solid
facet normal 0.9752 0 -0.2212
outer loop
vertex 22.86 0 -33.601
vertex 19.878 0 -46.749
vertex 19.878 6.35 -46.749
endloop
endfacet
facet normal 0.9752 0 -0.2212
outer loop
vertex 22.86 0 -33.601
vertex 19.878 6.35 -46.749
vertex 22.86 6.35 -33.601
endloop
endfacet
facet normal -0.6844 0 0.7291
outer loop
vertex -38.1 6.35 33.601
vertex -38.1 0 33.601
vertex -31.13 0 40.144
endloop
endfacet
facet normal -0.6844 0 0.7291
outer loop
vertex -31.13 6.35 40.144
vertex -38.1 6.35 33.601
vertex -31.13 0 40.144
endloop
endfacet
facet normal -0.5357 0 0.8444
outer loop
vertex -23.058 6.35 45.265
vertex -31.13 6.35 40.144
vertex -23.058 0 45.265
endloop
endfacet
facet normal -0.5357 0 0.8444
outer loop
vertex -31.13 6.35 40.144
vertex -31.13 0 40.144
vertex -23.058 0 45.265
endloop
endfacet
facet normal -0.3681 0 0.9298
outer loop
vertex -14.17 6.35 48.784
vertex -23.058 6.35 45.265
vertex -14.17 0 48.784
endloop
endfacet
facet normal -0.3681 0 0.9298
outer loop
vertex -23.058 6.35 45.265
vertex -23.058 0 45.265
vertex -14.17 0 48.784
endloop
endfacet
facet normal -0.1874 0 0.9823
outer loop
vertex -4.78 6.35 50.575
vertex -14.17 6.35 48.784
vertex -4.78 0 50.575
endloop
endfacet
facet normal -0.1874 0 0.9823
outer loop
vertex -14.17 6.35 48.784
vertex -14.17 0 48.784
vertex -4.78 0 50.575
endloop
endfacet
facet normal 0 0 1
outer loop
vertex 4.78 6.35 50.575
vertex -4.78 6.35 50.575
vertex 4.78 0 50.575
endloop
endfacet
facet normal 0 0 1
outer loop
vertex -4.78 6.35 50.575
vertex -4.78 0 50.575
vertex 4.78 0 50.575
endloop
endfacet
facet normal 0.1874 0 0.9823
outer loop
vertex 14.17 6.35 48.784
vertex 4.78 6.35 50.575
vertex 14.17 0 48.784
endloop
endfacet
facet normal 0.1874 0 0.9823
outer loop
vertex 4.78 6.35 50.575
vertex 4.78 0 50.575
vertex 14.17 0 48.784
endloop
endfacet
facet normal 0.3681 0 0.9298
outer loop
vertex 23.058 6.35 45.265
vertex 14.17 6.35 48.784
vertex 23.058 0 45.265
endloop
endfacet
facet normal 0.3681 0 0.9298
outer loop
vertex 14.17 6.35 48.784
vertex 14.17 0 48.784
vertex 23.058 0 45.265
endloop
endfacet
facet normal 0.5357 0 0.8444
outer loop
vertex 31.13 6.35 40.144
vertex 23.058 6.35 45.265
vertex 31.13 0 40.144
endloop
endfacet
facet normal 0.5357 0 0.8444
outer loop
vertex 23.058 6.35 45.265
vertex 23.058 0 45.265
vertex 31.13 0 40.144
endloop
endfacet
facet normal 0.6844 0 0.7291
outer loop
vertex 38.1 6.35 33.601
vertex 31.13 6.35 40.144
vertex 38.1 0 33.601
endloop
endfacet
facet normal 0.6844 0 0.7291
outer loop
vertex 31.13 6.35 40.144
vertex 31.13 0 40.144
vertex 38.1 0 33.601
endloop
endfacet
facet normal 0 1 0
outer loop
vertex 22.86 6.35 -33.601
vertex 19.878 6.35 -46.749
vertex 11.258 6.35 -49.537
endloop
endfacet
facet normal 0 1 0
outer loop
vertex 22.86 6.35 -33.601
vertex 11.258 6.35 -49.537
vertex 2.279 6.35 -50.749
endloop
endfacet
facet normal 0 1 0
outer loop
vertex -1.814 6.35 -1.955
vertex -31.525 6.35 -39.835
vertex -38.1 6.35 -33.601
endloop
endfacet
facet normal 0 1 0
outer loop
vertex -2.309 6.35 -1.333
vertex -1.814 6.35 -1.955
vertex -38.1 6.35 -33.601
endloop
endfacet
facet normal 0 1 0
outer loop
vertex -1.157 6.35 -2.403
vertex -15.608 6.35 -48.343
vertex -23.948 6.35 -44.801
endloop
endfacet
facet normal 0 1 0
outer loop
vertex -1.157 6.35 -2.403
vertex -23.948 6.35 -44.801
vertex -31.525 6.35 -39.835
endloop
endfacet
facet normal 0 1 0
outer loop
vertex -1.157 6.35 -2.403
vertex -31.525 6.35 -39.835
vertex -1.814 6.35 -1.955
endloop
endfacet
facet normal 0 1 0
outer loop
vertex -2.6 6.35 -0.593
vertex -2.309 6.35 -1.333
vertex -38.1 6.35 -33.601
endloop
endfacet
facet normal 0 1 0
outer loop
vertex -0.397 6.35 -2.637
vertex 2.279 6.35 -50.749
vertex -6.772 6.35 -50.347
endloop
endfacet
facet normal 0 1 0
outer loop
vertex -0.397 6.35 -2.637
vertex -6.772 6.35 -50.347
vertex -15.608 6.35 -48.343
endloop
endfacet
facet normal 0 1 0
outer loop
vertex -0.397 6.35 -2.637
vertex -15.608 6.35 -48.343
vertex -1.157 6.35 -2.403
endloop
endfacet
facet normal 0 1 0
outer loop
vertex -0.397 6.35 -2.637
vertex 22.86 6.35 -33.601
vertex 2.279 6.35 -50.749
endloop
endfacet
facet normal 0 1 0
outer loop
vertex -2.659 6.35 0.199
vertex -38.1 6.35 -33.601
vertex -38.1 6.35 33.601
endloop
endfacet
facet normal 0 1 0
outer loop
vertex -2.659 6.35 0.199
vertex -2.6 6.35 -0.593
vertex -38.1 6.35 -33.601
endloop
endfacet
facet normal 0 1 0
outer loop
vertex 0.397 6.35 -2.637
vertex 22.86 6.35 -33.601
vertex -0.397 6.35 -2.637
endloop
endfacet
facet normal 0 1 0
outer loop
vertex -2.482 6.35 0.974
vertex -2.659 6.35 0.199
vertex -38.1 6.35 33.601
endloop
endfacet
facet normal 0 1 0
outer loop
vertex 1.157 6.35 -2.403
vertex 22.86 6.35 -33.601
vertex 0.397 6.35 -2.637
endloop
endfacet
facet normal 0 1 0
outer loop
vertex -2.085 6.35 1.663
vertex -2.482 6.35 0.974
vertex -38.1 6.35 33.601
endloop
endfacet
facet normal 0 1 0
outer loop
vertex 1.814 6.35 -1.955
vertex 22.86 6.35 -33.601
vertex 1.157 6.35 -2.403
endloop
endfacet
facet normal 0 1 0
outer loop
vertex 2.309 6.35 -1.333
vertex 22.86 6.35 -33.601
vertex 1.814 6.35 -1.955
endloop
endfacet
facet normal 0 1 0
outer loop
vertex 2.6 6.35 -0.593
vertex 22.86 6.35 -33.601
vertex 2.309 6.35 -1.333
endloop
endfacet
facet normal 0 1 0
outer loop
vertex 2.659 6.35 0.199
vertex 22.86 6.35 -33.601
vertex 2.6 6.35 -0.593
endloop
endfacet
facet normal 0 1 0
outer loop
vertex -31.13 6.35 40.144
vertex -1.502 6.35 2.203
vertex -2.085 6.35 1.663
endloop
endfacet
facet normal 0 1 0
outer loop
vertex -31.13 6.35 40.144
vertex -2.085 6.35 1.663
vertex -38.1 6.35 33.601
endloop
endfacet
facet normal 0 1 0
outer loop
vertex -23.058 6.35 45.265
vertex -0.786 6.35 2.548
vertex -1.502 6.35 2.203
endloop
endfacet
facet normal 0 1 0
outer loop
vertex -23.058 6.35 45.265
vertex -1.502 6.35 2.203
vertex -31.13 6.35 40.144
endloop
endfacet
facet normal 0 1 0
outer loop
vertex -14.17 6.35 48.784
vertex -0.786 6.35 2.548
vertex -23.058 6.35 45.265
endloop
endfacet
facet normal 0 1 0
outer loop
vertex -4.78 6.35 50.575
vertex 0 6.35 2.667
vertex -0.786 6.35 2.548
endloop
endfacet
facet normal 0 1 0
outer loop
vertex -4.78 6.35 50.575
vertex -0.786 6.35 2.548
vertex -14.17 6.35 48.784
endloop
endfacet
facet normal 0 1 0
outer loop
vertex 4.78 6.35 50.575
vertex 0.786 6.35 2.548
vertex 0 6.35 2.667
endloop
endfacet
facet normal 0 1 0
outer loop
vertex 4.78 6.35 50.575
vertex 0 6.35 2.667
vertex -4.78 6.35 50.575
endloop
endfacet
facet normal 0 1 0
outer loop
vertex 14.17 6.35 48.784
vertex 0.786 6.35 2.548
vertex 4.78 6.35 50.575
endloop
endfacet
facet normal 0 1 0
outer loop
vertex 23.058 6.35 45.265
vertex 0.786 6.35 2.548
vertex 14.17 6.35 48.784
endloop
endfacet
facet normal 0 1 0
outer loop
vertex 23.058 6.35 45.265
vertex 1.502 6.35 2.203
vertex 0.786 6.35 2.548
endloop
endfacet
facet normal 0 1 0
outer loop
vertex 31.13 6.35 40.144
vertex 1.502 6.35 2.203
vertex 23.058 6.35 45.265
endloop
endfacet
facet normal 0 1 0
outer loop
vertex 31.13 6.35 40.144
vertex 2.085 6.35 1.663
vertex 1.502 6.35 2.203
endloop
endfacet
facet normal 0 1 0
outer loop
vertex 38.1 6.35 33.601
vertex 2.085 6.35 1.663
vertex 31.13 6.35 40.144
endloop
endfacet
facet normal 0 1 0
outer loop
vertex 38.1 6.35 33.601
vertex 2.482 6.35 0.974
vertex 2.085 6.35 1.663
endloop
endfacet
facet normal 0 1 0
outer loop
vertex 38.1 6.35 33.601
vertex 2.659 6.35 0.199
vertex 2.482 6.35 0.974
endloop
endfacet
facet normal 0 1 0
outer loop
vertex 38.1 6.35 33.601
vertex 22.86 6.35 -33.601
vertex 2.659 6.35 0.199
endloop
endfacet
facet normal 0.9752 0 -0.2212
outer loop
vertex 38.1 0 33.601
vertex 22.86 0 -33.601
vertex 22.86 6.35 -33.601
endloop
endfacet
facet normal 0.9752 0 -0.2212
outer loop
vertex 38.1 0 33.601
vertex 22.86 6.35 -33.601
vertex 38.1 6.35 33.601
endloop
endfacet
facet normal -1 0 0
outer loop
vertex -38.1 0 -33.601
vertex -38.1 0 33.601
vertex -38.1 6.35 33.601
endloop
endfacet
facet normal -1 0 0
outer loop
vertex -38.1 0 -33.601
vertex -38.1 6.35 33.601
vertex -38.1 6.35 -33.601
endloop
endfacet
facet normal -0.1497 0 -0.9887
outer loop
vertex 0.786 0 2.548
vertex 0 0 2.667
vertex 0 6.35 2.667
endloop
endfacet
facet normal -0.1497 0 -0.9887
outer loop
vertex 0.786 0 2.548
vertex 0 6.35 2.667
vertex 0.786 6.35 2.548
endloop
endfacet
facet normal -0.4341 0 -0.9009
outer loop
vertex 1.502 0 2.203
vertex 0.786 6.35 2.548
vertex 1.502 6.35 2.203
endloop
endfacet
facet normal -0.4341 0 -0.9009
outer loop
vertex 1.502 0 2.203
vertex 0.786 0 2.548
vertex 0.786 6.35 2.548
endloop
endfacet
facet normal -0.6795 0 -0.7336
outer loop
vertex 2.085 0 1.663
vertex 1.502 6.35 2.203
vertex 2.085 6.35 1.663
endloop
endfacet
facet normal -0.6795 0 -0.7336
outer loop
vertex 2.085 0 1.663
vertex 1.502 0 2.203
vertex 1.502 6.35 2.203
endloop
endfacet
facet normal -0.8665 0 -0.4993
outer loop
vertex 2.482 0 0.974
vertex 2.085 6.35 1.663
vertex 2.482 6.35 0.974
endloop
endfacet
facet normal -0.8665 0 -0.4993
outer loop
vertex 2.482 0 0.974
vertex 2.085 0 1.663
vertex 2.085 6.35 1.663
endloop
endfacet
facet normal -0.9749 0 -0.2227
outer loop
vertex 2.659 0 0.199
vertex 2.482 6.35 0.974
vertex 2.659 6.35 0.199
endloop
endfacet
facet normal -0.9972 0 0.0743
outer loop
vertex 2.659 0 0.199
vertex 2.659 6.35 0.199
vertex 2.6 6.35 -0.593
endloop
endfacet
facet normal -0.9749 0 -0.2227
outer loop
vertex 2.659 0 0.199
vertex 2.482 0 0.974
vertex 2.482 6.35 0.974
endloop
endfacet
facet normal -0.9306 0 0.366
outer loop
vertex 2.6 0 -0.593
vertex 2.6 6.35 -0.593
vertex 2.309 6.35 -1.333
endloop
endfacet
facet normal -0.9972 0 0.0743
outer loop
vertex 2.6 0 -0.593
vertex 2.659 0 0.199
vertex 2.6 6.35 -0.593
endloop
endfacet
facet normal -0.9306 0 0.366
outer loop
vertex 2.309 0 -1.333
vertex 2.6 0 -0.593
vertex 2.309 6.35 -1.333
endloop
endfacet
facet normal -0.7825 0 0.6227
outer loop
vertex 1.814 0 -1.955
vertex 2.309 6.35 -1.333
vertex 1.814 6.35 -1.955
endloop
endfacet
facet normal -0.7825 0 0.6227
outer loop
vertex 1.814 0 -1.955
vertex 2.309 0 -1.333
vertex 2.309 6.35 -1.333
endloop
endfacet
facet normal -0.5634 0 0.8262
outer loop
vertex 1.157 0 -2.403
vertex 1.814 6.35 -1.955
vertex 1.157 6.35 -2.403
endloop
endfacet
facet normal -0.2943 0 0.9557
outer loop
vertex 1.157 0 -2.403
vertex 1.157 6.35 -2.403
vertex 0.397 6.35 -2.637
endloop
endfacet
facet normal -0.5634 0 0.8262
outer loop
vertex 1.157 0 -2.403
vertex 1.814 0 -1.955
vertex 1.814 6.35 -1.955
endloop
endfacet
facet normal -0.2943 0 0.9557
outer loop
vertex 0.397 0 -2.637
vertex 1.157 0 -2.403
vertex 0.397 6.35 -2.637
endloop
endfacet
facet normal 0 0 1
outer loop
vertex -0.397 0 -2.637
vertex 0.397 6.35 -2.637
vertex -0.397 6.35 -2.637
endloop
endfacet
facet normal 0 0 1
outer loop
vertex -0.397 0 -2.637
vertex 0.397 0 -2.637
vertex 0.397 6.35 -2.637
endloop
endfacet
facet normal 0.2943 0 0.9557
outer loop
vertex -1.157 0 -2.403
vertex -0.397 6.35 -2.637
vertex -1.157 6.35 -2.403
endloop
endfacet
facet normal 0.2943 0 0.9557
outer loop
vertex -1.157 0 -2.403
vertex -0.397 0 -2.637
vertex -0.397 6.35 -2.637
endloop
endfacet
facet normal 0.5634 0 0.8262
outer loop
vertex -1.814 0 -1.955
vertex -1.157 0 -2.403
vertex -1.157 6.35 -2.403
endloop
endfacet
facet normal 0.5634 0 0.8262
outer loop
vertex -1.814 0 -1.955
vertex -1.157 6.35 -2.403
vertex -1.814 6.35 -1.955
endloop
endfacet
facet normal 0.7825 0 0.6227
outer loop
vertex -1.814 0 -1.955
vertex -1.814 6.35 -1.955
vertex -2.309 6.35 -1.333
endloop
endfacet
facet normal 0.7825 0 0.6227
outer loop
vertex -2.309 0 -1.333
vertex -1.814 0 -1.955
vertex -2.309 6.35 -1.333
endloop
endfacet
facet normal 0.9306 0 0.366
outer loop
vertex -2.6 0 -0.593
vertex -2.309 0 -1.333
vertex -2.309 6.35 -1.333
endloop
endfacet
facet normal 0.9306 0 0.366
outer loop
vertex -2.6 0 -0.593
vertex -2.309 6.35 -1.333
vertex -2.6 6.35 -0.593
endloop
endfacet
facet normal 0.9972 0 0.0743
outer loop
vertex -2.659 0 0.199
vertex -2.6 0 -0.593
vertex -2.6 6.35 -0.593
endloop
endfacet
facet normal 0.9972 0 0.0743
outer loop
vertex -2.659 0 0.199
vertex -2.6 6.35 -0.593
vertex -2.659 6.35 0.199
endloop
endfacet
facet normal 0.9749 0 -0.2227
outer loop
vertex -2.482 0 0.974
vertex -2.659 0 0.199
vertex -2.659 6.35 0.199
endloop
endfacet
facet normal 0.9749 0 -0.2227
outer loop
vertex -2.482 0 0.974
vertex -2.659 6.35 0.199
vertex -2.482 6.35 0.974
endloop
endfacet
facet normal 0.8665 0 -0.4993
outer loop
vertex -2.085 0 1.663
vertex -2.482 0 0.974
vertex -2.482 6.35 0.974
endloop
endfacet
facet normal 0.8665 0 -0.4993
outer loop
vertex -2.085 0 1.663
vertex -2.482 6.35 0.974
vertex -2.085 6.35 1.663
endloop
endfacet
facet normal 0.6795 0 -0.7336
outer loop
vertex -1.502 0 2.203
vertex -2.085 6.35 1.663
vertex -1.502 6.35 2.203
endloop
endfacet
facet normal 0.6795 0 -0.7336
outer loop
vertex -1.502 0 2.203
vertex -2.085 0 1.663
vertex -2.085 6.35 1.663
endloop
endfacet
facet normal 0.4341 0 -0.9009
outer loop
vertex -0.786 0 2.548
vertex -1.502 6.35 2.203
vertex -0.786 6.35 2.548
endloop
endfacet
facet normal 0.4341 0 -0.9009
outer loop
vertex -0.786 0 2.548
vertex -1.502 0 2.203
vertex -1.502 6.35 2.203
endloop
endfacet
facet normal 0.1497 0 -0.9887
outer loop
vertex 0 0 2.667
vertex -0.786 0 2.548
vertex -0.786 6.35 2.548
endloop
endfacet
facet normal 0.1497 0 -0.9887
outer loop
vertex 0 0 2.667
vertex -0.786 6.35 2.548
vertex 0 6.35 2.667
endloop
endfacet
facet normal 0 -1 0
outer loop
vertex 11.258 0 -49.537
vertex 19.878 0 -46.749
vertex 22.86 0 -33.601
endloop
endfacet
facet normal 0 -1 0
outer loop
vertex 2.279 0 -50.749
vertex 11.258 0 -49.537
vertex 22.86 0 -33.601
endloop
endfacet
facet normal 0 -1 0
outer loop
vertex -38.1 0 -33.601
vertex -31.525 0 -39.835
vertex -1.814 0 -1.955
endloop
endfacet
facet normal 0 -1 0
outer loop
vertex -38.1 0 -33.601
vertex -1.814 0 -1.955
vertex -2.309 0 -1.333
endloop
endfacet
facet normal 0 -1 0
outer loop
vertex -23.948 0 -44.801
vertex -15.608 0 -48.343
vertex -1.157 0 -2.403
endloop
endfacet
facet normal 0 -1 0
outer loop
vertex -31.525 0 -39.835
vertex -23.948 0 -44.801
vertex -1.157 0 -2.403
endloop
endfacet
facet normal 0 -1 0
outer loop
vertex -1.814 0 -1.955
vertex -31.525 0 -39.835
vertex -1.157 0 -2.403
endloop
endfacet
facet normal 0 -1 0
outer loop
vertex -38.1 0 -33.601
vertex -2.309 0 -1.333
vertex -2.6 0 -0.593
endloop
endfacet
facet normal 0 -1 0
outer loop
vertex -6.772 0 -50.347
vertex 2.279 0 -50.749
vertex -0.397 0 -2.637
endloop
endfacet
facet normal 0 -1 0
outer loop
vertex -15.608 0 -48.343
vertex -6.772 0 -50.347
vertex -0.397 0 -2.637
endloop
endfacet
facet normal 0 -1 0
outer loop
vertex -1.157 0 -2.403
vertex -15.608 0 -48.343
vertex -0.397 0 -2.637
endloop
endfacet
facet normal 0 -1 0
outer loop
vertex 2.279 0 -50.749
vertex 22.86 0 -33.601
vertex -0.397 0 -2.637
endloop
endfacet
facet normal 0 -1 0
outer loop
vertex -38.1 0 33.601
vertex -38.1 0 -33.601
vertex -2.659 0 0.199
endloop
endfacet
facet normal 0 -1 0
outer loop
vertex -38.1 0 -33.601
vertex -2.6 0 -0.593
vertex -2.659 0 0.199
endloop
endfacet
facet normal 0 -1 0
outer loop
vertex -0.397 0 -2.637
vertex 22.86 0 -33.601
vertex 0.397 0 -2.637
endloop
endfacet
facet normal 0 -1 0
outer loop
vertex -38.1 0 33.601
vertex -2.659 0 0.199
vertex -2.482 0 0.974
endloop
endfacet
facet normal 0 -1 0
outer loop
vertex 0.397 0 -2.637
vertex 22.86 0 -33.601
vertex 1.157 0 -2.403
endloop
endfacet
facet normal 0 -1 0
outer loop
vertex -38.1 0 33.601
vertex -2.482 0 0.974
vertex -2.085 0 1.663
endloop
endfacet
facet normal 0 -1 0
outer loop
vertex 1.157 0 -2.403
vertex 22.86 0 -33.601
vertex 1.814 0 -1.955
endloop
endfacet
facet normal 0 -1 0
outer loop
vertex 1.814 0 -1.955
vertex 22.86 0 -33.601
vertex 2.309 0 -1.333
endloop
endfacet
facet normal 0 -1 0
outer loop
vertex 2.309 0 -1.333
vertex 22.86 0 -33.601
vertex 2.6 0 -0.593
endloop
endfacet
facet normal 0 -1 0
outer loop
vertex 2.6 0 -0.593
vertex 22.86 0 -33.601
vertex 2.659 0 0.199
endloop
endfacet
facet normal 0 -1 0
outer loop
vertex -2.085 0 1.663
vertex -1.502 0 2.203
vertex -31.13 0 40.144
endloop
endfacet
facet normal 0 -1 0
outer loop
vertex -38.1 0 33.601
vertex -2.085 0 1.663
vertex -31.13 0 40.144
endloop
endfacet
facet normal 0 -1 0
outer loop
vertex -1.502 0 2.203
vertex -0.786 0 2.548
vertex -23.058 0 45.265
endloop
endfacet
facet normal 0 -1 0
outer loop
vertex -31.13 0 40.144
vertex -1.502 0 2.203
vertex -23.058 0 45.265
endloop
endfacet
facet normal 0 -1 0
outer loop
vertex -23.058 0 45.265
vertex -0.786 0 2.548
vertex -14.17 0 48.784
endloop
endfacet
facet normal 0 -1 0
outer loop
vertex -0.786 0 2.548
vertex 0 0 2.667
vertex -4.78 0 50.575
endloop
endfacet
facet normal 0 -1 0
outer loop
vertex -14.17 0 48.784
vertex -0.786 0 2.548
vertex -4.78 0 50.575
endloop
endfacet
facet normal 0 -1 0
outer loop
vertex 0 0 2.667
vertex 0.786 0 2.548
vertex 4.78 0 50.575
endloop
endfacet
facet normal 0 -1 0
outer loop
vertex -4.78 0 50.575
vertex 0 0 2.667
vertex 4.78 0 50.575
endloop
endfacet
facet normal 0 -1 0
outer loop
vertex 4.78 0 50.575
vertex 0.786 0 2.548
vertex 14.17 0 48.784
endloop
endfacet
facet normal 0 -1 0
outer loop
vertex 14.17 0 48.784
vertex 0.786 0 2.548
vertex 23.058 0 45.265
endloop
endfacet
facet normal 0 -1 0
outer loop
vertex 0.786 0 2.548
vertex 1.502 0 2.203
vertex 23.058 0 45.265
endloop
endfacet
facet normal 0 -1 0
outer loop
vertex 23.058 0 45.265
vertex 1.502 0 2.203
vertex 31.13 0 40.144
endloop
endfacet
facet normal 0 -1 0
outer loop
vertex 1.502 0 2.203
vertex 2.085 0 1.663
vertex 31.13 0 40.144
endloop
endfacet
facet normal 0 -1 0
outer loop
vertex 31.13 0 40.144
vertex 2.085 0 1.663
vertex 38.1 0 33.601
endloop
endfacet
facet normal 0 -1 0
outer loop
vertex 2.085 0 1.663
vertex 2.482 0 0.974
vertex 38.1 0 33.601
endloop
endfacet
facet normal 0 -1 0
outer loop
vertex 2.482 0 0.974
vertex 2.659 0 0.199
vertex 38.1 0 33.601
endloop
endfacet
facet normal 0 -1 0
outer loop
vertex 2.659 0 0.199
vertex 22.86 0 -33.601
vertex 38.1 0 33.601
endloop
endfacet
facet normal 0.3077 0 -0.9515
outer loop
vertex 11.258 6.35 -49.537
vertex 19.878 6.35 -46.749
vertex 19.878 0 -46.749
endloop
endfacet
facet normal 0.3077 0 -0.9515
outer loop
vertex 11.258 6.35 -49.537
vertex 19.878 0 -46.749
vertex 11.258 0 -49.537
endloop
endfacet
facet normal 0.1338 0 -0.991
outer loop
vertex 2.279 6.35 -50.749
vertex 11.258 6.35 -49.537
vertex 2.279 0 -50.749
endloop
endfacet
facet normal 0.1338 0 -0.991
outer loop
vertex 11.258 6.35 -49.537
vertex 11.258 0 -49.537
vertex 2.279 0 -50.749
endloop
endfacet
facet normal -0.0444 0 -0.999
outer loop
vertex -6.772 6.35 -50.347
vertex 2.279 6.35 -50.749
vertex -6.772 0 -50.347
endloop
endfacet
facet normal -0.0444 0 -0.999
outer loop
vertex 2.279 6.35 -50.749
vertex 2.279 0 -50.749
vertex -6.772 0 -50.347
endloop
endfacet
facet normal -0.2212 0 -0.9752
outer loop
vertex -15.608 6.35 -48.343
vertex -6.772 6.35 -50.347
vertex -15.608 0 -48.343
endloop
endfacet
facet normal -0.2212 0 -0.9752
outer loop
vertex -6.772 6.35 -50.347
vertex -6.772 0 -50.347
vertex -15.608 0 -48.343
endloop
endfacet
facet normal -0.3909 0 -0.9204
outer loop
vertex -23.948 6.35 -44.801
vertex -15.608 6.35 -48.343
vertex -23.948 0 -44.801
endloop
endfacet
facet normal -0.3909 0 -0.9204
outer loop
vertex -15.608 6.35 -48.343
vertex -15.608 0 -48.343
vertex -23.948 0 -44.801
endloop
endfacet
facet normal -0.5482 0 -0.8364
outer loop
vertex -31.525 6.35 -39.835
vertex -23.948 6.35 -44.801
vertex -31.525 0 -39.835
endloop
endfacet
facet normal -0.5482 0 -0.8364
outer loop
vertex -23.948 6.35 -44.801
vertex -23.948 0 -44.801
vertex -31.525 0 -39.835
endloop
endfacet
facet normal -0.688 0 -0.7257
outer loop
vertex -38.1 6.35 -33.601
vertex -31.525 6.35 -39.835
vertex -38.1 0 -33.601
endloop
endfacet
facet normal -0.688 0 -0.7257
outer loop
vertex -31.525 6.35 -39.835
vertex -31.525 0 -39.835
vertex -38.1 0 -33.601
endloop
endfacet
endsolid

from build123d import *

# Parameters (mm, degrees)
SKETCH1_R           = 50.8
SKETCH1_R_2         = 2.666666667
BOSS_EXTRUDE1_DEPTH = 6.35
CUT_EXTRUDE1_START  = -12.7
CUT_EXTRUDE1_DEPTH  = 12.7
CUT_EXTRUDE2_START  = -17.348
CUT_EXTRUDE2_DEPTH  = 17.348


with BuildPart() as part:
    # Sketch1 → Boss-Extrude1 (new body)
    with BuildSketch(Plane(origin=(0, 0, 0), x_dir=(1, 0, 0), z_dir=(0, 1, 0))):
        with Locations(Location((0, 0, 0), (0, 0, 270))):
            Circle(SKETCH1_R)
        with Locations(Location((0, 0, 0), (0, 0, 270))):
            Circle(SKETCH1_R_2, mode=Mode.SUBTRACT)
    extrude(amount=BOSS_EXTRUDE1_DEPTH)

    # Sketch2 → Cut-Extrude1 (cut)
    with BuildSketch(Plane(origin=(0, 6.35, 0), x_dir=(1, 0, 0), z_dir=(0, 1, 0)).offset(CUT_EXTRUDE1_START)):
        with BuildLine():
            ThreePointArc((50.8, 0), (47.519048812, 17.960512242), (38.1, 33.601041651))
            Line((38.1, 33.601041651), (38.1, 0))
            Line((38.1, 0), (38.1, -33.601041651))
            ThreePointArc((38.1, -33.601041651), (47.519048812, -17.960512242), (50.8, 0))
        make_face()
        with BuildLine():
            ThreePointArc((-38.1, 33.601041651), (-47.519048812, 17.960512242), (-50.8, 0))
            Line((-50.8, 0), (-38.1, 0))
            Line((-38.1, 0), (-38.1, 33.601041651))
        make_face()
        with BuildLine():
            Line((-38.1, 0), (-50.8, 0))
            ThreePointArc((-50.8, 0), (-47.519048812, -17.960512242), (-38.1, -33.601041651))
            Line((-38.1, -33.601041651), (-38.1, 0))
        make_face()
    extrude(amount=CUT_EXTRUDE1_DEPTH, mode=Mode.SUBTRACT)

    # Sketch3 → Cut-Extrude2 (cut)
    with BuildSketch(Plane(origin=(0, 6.35, 0), x_dir=(1, 0, 0), z_dir=(0, 1, 0)).offset(CUT_EXTRUDE2_START)):
        with BuildLine():
            Line((22.86, 33.601041651), (38.1, 33.601041651))
            ThreePointArc((38.1, 33.601041651), (29.725219859, 41.19528255), (19.87826087, 46.74927534))
            Line((19.87826087, 46.74927534), (22.86, 33.601041651))
        make_face()
        Polygon((38.1, 33.601041651), (22.86, 33.601041651), (38.1, -33.601041651), align=None)
    extrude(amount=CUT_EXTRUDE2_DEPTH, mode=Mode.SUBTRACT)


solid = part.part
